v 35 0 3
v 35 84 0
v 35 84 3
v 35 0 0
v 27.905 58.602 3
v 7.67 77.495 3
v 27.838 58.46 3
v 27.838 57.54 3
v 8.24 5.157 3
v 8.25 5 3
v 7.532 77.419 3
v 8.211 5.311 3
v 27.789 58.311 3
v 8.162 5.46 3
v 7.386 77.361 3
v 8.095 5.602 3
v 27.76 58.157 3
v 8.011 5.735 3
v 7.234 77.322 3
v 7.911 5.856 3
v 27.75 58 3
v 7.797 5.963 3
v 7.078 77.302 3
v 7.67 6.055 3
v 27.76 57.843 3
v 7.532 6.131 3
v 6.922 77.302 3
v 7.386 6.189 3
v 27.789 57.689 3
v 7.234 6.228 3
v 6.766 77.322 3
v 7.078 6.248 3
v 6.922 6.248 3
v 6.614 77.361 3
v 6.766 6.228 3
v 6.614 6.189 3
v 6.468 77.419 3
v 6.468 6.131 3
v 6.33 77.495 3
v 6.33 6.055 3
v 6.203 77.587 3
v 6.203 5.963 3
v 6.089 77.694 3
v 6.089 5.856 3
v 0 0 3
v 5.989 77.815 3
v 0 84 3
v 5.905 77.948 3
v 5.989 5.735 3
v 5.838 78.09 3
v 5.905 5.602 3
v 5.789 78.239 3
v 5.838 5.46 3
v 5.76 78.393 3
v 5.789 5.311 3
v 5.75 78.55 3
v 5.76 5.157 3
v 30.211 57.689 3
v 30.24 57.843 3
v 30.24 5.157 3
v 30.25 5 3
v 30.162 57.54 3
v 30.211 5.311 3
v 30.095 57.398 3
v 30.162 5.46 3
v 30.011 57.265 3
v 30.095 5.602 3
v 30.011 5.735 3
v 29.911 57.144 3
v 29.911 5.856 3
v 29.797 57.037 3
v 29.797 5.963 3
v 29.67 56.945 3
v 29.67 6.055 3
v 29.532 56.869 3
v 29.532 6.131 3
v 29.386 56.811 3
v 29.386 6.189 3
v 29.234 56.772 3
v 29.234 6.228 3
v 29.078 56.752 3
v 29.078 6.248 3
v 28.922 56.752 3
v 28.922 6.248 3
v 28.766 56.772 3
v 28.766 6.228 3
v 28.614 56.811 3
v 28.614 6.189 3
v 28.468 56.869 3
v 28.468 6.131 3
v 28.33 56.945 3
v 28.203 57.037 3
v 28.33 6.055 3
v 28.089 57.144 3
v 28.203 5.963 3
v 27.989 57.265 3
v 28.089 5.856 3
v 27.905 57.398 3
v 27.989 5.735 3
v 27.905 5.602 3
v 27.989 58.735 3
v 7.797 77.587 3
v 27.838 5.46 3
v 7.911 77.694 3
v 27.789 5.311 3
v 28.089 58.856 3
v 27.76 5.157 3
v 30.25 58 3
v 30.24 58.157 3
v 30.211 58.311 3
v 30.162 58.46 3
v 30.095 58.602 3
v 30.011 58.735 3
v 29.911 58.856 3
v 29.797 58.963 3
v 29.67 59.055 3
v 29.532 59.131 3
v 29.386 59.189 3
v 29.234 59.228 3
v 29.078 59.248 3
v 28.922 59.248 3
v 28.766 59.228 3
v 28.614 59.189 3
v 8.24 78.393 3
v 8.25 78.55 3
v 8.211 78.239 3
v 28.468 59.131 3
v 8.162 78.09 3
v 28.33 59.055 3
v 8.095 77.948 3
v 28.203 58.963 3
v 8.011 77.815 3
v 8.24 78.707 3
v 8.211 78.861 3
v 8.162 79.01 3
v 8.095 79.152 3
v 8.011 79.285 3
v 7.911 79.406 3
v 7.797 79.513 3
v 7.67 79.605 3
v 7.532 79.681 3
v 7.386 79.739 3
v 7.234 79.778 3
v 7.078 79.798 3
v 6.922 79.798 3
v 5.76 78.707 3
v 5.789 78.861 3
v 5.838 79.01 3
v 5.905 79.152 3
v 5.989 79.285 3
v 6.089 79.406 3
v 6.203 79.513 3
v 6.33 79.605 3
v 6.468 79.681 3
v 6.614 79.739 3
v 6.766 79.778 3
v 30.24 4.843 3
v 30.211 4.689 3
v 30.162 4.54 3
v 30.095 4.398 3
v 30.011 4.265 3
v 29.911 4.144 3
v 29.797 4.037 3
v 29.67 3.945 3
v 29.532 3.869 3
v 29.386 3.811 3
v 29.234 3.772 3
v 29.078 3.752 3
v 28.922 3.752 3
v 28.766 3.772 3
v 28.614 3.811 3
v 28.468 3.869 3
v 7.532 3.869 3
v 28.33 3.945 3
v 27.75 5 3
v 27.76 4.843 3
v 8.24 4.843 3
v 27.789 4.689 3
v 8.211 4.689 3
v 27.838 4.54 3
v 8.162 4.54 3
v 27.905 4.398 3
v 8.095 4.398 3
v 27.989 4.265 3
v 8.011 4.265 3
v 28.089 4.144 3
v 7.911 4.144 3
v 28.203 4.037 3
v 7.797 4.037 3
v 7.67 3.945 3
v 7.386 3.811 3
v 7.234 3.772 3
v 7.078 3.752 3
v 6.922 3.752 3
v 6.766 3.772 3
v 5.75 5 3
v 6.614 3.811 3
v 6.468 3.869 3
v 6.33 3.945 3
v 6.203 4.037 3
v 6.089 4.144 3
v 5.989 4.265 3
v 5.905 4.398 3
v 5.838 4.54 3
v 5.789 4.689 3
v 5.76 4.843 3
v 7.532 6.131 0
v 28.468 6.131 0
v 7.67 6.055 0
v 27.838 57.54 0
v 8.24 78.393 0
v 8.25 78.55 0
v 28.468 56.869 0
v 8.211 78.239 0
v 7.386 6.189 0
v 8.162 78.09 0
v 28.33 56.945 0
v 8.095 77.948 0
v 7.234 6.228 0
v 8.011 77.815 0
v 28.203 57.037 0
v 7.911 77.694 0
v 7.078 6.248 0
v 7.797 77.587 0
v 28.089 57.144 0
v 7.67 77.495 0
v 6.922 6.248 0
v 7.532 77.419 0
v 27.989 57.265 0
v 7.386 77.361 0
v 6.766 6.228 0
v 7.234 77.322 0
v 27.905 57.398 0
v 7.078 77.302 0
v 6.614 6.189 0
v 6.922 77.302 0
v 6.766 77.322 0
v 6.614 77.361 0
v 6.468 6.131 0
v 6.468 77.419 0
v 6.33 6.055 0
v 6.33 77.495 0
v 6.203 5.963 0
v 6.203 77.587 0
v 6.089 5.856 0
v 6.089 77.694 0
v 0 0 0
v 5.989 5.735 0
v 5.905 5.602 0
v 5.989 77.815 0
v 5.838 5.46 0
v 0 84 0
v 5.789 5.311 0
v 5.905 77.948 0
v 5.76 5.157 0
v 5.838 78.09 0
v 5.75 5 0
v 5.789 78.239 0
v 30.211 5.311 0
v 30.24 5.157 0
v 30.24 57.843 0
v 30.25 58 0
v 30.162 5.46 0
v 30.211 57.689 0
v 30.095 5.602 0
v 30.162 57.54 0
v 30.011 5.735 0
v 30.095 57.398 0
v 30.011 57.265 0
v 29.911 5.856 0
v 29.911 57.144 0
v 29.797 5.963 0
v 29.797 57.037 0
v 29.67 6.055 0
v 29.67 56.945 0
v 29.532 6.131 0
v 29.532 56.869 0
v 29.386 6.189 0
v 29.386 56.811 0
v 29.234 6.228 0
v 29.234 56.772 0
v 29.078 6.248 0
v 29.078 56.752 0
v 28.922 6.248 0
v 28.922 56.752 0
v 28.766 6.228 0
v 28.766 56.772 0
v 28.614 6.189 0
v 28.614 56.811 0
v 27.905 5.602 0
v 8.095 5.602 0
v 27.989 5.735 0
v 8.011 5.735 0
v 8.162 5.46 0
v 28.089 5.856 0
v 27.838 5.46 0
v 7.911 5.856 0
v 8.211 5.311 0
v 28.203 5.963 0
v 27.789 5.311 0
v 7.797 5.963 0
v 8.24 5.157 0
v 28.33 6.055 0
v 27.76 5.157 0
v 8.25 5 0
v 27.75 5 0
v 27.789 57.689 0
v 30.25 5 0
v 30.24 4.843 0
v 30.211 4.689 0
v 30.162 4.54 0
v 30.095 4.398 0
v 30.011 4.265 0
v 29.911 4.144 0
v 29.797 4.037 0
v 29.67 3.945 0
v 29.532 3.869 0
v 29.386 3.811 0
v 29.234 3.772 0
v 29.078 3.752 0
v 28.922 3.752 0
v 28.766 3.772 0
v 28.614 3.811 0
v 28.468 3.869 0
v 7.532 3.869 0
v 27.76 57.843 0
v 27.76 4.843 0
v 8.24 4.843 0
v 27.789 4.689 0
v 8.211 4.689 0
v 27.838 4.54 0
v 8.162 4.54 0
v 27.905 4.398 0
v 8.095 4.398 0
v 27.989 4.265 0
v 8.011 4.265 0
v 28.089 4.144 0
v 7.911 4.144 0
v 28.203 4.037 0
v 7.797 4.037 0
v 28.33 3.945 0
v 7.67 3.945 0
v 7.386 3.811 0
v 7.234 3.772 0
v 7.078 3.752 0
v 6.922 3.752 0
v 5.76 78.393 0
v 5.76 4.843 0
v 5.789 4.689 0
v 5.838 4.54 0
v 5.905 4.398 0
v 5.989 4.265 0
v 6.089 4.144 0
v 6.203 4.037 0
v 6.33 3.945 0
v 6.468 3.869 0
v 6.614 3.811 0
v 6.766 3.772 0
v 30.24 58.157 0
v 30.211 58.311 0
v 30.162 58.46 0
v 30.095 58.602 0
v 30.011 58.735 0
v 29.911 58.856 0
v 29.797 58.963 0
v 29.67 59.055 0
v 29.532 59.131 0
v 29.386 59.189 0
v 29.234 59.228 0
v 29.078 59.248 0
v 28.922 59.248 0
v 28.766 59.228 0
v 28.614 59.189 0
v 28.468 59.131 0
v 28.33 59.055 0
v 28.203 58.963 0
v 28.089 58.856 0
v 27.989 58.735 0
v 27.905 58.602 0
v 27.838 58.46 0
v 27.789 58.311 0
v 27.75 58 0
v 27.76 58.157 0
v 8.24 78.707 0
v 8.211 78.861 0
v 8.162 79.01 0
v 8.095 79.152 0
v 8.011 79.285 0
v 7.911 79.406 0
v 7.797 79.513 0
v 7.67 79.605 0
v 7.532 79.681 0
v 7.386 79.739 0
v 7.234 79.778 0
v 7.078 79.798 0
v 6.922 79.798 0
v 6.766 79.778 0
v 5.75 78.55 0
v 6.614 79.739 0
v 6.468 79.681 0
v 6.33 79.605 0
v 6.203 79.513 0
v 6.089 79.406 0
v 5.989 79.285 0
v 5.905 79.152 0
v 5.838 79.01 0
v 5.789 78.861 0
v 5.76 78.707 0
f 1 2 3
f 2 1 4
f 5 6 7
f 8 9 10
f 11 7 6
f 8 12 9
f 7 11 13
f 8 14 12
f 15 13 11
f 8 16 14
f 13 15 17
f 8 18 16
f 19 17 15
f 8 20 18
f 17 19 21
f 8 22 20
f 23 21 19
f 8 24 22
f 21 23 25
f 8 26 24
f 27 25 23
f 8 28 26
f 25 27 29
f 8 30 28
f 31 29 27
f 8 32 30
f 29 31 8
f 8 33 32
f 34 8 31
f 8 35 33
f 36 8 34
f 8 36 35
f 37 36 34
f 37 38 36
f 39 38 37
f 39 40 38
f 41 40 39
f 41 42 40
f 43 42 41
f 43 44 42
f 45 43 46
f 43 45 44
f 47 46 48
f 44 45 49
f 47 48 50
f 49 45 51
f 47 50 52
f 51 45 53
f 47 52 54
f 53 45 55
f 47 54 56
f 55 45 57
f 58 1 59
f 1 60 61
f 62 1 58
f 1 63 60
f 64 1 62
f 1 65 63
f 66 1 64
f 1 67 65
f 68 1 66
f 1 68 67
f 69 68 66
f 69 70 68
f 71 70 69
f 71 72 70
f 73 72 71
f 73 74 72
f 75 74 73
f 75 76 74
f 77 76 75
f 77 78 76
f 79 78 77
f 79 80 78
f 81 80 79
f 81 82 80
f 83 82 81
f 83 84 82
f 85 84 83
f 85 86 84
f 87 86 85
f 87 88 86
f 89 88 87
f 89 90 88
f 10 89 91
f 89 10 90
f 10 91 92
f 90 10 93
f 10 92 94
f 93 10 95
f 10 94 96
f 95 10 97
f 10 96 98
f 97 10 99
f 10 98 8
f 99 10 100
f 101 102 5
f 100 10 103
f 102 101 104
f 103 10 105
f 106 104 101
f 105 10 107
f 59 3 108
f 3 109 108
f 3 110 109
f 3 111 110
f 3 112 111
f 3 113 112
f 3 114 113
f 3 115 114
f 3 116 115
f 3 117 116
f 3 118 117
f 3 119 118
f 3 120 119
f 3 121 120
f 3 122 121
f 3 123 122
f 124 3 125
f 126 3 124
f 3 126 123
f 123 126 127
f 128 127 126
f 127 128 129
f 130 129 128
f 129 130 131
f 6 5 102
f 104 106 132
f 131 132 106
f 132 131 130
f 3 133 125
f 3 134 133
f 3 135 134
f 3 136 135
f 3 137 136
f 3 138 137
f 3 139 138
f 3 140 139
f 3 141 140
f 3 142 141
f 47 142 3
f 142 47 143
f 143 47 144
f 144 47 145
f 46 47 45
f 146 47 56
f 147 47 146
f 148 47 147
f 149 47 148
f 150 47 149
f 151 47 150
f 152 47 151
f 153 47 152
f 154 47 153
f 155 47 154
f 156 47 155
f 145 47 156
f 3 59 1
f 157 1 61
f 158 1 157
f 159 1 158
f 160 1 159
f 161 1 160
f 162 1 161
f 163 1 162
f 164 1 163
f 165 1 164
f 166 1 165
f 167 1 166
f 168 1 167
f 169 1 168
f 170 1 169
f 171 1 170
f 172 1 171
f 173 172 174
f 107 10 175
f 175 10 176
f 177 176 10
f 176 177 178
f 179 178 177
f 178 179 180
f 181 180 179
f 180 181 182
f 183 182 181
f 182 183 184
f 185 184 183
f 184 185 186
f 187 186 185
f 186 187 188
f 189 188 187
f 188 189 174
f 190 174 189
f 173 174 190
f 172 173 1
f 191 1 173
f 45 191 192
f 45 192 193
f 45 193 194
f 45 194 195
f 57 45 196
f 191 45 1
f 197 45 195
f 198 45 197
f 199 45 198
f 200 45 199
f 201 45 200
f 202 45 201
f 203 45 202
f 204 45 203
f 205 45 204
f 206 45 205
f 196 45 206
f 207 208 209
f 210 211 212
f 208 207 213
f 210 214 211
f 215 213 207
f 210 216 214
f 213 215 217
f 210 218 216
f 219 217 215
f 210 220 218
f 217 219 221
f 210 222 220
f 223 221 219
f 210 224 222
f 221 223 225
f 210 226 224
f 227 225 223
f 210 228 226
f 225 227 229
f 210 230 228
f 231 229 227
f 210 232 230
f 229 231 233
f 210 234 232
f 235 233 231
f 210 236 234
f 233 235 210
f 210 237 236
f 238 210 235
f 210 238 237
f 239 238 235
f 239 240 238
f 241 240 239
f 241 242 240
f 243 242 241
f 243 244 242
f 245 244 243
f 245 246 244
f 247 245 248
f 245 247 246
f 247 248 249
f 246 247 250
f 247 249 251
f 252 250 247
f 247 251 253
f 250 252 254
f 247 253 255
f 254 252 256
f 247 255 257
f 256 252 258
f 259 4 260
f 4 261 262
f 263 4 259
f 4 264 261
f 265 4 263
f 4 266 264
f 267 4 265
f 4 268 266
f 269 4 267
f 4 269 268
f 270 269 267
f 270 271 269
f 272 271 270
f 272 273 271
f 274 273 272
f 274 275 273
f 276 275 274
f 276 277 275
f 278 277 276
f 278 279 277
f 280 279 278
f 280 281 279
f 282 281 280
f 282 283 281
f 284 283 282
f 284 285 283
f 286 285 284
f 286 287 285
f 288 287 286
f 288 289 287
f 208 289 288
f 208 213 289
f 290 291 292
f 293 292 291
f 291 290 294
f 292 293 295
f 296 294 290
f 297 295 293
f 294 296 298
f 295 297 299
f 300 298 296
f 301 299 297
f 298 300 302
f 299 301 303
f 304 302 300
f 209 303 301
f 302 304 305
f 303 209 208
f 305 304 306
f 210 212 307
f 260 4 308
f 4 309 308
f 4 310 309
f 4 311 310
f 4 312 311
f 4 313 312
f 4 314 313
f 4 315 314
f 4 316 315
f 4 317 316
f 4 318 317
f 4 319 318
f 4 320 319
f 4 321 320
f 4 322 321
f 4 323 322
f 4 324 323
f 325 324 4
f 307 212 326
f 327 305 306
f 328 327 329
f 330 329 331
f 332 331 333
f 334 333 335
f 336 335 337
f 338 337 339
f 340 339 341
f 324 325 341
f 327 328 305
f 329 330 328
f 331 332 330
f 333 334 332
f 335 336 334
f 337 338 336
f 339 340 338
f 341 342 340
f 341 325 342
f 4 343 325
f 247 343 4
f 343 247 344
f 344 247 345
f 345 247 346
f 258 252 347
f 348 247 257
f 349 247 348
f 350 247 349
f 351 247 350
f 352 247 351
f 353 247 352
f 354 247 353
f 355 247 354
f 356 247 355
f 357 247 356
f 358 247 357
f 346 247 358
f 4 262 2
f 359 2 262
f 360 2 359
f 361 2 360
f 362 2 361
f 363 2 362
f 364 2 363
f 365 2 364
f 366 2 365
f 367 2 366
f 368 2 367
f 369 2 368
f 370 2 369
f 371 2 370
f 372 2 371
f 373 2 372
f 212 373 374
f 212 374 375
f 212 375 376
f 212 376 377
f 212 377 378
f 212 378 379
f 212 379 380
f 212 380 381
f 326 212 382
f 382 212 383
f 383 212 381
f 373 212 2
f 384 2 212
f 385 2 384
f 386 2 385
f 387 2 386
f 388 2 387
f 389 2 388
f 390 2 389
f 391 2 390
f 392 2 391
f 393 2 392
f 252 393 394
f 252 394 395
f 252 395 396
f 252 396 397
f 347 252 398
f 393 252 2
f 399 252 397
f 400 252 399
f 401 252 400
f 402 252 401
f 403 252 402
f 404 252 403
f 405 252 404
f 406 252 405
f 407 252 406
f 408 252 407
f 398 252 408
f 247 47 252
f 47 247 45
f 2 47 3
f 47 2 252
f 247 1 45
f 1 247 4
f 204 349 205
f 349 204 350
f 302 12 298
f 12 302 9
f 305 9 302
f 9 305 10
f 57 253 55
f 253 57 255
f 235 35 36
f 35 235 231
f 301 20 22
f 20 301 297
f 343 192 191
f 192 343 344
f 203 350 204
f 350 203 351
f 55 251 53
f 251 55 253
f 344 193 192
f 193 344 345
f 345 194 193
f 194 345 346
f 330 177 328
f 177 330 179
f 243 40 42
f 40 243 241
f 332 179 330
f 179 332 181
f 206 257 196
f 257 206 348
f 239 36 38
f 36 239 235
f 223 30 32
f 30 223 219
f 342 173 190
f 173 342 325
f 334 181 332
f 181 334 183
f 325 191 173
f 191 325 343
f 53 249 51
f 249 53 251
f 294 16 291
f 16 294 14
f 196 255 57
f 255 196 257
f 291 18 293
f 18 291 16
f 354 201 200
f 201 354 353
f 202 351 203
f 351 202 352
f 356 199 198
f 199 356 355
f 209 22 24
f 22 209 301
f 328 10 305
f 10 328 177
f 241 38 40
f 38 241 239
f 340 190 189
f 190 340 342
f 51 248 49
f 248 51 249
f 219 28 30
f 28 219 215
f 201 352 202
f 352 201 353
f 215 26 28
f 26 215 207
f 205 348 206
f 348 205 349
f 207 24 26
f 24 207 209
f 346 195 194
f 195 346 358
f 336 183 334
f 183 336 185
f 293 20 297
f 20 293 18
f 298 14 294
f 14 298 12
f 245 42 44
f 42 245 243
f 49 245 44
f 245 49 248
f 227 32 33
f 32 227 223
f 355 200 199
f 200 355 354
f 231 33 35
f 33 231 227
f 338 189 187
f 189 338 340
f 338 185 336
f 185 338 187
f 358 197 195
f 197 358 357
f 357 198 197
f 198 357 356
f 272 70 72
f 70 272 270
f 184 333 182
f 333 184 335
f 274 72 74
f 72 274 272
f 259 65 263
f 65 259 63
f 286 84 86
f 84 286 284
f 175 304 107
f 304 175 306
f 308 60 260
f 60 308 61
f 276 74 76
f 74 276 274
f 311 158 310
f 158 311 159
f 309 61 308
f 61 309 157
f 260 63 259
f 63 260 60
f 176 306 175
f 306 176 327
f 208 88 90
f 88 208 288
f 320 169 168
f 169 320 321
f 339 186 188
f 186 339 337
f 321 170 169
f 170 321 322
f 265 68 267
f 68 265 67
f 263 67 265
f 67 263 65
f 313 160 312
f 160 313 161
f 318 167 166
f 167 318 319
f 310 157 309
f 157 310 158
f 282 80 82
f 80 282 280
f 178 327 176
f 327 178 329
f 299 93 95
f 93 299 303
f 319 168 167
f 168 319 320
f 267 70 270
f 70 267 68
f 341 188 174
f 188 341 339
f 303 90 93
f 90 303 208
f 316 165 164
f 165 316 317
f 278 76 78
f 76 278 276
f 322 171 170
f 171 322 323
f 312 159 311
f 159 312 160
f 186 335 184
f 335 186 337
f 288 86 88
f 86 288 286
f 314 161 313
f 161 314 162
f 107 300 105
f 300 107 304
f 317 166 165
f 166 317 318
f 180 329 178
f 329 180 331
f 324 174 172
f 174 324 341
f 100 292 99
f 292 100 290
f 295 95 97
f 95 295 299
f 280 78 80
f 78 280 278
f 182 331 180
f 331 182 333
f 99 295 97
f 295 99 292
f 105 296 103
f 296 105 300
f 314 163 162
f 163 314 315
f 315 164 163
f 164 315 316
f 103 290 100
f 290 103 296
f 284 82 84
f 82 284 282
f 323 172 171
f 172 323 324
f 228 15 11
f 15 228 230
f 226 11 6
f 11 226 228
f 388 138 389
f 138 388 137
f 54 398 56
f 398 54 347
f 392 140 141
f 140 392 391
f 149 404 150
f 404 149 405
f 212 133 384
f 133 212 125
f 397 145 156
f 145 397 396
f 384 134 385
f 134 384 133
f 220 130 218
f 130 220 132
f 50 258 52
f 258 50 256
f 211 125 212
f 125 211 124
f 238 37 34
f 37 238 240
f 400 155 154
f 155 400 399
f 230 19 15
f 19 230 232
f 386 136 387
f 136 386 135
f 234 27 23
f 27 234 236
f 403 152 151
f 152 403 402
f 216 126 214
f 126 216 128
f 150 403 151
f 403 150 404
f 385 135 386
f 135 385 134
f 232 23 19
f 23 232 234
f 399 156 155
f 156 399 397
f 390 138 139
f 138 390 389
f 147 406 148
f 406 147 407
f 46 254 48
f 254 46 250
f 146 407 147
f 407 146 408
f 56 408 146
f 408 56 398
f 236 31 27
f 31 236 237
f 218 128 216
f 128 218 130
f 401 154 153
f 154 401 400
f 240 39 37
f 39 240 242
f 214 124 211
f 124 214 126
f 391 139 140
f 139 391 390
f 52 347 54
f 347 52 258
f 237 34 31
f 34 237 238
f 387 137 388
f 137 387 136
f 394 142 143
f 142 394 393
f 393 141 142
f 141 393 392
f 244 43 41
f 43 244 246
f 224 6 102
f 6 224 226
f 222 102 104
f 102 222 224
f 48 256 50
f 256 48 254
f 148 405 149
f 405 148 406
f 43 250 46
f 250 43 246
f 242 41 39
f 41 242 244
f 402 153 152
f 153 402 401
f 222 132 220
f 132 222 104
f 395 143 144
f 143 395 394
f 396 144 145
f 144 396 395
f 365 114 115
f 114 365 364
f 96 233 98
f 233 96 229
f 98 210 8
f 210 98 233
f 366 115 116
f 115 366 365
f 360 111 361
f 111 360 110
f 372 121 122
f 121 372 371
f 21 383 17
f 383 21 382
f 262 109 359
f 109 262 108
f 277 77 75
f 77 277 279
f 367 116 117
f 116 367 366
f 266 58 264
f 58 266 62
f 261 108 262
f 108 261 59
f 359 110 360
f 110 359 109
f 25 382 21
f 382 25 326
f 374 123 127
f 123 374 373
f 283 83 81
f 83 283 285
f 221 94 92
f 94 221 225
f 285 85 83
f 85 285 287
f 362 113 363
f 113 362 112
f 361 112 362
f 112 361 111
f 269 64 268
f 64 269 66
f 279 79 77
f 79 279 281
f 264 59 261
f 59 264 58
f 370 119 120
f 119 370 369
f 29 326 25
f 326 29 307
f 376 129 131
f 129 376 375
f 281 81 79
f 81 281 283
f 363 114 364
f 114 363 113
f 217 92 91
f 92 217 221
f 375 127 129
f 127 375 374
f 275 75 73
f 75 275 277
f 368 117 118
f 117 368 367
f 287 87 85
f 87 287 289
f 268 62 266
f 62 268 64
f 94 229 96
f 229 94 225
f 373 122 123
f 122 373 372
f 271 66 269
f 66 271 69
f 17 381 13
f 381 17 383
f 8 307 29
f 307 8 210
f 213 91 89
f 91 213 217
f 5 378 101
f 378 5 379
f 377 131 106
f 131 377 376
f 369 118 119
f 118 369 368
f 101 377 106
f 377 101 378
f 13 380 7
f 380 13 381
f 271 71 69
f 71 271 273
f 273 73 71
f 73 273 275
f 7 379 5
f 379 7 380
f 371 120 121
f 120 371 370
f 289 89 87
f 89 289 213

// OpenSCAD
$fa = 1;
$fs = 0.5;
$fn = 50;

post_h = 32;
post_r = 1.25;

difference() {
    cube([35,84,3]);
    // together side posts
    translate([7, 5, -1]) cylinder(h=post_h, r=post_r);
    translate([29, 5, -1]) cylinder(h=post_h, r=post_r);
    // not together side posts
    translate([7, 78.55, -1]) cylinder(h=post_h, r=post_r);
    translate([29, 58, -1]) cylinder(h=post_h, r=post_r);
}
